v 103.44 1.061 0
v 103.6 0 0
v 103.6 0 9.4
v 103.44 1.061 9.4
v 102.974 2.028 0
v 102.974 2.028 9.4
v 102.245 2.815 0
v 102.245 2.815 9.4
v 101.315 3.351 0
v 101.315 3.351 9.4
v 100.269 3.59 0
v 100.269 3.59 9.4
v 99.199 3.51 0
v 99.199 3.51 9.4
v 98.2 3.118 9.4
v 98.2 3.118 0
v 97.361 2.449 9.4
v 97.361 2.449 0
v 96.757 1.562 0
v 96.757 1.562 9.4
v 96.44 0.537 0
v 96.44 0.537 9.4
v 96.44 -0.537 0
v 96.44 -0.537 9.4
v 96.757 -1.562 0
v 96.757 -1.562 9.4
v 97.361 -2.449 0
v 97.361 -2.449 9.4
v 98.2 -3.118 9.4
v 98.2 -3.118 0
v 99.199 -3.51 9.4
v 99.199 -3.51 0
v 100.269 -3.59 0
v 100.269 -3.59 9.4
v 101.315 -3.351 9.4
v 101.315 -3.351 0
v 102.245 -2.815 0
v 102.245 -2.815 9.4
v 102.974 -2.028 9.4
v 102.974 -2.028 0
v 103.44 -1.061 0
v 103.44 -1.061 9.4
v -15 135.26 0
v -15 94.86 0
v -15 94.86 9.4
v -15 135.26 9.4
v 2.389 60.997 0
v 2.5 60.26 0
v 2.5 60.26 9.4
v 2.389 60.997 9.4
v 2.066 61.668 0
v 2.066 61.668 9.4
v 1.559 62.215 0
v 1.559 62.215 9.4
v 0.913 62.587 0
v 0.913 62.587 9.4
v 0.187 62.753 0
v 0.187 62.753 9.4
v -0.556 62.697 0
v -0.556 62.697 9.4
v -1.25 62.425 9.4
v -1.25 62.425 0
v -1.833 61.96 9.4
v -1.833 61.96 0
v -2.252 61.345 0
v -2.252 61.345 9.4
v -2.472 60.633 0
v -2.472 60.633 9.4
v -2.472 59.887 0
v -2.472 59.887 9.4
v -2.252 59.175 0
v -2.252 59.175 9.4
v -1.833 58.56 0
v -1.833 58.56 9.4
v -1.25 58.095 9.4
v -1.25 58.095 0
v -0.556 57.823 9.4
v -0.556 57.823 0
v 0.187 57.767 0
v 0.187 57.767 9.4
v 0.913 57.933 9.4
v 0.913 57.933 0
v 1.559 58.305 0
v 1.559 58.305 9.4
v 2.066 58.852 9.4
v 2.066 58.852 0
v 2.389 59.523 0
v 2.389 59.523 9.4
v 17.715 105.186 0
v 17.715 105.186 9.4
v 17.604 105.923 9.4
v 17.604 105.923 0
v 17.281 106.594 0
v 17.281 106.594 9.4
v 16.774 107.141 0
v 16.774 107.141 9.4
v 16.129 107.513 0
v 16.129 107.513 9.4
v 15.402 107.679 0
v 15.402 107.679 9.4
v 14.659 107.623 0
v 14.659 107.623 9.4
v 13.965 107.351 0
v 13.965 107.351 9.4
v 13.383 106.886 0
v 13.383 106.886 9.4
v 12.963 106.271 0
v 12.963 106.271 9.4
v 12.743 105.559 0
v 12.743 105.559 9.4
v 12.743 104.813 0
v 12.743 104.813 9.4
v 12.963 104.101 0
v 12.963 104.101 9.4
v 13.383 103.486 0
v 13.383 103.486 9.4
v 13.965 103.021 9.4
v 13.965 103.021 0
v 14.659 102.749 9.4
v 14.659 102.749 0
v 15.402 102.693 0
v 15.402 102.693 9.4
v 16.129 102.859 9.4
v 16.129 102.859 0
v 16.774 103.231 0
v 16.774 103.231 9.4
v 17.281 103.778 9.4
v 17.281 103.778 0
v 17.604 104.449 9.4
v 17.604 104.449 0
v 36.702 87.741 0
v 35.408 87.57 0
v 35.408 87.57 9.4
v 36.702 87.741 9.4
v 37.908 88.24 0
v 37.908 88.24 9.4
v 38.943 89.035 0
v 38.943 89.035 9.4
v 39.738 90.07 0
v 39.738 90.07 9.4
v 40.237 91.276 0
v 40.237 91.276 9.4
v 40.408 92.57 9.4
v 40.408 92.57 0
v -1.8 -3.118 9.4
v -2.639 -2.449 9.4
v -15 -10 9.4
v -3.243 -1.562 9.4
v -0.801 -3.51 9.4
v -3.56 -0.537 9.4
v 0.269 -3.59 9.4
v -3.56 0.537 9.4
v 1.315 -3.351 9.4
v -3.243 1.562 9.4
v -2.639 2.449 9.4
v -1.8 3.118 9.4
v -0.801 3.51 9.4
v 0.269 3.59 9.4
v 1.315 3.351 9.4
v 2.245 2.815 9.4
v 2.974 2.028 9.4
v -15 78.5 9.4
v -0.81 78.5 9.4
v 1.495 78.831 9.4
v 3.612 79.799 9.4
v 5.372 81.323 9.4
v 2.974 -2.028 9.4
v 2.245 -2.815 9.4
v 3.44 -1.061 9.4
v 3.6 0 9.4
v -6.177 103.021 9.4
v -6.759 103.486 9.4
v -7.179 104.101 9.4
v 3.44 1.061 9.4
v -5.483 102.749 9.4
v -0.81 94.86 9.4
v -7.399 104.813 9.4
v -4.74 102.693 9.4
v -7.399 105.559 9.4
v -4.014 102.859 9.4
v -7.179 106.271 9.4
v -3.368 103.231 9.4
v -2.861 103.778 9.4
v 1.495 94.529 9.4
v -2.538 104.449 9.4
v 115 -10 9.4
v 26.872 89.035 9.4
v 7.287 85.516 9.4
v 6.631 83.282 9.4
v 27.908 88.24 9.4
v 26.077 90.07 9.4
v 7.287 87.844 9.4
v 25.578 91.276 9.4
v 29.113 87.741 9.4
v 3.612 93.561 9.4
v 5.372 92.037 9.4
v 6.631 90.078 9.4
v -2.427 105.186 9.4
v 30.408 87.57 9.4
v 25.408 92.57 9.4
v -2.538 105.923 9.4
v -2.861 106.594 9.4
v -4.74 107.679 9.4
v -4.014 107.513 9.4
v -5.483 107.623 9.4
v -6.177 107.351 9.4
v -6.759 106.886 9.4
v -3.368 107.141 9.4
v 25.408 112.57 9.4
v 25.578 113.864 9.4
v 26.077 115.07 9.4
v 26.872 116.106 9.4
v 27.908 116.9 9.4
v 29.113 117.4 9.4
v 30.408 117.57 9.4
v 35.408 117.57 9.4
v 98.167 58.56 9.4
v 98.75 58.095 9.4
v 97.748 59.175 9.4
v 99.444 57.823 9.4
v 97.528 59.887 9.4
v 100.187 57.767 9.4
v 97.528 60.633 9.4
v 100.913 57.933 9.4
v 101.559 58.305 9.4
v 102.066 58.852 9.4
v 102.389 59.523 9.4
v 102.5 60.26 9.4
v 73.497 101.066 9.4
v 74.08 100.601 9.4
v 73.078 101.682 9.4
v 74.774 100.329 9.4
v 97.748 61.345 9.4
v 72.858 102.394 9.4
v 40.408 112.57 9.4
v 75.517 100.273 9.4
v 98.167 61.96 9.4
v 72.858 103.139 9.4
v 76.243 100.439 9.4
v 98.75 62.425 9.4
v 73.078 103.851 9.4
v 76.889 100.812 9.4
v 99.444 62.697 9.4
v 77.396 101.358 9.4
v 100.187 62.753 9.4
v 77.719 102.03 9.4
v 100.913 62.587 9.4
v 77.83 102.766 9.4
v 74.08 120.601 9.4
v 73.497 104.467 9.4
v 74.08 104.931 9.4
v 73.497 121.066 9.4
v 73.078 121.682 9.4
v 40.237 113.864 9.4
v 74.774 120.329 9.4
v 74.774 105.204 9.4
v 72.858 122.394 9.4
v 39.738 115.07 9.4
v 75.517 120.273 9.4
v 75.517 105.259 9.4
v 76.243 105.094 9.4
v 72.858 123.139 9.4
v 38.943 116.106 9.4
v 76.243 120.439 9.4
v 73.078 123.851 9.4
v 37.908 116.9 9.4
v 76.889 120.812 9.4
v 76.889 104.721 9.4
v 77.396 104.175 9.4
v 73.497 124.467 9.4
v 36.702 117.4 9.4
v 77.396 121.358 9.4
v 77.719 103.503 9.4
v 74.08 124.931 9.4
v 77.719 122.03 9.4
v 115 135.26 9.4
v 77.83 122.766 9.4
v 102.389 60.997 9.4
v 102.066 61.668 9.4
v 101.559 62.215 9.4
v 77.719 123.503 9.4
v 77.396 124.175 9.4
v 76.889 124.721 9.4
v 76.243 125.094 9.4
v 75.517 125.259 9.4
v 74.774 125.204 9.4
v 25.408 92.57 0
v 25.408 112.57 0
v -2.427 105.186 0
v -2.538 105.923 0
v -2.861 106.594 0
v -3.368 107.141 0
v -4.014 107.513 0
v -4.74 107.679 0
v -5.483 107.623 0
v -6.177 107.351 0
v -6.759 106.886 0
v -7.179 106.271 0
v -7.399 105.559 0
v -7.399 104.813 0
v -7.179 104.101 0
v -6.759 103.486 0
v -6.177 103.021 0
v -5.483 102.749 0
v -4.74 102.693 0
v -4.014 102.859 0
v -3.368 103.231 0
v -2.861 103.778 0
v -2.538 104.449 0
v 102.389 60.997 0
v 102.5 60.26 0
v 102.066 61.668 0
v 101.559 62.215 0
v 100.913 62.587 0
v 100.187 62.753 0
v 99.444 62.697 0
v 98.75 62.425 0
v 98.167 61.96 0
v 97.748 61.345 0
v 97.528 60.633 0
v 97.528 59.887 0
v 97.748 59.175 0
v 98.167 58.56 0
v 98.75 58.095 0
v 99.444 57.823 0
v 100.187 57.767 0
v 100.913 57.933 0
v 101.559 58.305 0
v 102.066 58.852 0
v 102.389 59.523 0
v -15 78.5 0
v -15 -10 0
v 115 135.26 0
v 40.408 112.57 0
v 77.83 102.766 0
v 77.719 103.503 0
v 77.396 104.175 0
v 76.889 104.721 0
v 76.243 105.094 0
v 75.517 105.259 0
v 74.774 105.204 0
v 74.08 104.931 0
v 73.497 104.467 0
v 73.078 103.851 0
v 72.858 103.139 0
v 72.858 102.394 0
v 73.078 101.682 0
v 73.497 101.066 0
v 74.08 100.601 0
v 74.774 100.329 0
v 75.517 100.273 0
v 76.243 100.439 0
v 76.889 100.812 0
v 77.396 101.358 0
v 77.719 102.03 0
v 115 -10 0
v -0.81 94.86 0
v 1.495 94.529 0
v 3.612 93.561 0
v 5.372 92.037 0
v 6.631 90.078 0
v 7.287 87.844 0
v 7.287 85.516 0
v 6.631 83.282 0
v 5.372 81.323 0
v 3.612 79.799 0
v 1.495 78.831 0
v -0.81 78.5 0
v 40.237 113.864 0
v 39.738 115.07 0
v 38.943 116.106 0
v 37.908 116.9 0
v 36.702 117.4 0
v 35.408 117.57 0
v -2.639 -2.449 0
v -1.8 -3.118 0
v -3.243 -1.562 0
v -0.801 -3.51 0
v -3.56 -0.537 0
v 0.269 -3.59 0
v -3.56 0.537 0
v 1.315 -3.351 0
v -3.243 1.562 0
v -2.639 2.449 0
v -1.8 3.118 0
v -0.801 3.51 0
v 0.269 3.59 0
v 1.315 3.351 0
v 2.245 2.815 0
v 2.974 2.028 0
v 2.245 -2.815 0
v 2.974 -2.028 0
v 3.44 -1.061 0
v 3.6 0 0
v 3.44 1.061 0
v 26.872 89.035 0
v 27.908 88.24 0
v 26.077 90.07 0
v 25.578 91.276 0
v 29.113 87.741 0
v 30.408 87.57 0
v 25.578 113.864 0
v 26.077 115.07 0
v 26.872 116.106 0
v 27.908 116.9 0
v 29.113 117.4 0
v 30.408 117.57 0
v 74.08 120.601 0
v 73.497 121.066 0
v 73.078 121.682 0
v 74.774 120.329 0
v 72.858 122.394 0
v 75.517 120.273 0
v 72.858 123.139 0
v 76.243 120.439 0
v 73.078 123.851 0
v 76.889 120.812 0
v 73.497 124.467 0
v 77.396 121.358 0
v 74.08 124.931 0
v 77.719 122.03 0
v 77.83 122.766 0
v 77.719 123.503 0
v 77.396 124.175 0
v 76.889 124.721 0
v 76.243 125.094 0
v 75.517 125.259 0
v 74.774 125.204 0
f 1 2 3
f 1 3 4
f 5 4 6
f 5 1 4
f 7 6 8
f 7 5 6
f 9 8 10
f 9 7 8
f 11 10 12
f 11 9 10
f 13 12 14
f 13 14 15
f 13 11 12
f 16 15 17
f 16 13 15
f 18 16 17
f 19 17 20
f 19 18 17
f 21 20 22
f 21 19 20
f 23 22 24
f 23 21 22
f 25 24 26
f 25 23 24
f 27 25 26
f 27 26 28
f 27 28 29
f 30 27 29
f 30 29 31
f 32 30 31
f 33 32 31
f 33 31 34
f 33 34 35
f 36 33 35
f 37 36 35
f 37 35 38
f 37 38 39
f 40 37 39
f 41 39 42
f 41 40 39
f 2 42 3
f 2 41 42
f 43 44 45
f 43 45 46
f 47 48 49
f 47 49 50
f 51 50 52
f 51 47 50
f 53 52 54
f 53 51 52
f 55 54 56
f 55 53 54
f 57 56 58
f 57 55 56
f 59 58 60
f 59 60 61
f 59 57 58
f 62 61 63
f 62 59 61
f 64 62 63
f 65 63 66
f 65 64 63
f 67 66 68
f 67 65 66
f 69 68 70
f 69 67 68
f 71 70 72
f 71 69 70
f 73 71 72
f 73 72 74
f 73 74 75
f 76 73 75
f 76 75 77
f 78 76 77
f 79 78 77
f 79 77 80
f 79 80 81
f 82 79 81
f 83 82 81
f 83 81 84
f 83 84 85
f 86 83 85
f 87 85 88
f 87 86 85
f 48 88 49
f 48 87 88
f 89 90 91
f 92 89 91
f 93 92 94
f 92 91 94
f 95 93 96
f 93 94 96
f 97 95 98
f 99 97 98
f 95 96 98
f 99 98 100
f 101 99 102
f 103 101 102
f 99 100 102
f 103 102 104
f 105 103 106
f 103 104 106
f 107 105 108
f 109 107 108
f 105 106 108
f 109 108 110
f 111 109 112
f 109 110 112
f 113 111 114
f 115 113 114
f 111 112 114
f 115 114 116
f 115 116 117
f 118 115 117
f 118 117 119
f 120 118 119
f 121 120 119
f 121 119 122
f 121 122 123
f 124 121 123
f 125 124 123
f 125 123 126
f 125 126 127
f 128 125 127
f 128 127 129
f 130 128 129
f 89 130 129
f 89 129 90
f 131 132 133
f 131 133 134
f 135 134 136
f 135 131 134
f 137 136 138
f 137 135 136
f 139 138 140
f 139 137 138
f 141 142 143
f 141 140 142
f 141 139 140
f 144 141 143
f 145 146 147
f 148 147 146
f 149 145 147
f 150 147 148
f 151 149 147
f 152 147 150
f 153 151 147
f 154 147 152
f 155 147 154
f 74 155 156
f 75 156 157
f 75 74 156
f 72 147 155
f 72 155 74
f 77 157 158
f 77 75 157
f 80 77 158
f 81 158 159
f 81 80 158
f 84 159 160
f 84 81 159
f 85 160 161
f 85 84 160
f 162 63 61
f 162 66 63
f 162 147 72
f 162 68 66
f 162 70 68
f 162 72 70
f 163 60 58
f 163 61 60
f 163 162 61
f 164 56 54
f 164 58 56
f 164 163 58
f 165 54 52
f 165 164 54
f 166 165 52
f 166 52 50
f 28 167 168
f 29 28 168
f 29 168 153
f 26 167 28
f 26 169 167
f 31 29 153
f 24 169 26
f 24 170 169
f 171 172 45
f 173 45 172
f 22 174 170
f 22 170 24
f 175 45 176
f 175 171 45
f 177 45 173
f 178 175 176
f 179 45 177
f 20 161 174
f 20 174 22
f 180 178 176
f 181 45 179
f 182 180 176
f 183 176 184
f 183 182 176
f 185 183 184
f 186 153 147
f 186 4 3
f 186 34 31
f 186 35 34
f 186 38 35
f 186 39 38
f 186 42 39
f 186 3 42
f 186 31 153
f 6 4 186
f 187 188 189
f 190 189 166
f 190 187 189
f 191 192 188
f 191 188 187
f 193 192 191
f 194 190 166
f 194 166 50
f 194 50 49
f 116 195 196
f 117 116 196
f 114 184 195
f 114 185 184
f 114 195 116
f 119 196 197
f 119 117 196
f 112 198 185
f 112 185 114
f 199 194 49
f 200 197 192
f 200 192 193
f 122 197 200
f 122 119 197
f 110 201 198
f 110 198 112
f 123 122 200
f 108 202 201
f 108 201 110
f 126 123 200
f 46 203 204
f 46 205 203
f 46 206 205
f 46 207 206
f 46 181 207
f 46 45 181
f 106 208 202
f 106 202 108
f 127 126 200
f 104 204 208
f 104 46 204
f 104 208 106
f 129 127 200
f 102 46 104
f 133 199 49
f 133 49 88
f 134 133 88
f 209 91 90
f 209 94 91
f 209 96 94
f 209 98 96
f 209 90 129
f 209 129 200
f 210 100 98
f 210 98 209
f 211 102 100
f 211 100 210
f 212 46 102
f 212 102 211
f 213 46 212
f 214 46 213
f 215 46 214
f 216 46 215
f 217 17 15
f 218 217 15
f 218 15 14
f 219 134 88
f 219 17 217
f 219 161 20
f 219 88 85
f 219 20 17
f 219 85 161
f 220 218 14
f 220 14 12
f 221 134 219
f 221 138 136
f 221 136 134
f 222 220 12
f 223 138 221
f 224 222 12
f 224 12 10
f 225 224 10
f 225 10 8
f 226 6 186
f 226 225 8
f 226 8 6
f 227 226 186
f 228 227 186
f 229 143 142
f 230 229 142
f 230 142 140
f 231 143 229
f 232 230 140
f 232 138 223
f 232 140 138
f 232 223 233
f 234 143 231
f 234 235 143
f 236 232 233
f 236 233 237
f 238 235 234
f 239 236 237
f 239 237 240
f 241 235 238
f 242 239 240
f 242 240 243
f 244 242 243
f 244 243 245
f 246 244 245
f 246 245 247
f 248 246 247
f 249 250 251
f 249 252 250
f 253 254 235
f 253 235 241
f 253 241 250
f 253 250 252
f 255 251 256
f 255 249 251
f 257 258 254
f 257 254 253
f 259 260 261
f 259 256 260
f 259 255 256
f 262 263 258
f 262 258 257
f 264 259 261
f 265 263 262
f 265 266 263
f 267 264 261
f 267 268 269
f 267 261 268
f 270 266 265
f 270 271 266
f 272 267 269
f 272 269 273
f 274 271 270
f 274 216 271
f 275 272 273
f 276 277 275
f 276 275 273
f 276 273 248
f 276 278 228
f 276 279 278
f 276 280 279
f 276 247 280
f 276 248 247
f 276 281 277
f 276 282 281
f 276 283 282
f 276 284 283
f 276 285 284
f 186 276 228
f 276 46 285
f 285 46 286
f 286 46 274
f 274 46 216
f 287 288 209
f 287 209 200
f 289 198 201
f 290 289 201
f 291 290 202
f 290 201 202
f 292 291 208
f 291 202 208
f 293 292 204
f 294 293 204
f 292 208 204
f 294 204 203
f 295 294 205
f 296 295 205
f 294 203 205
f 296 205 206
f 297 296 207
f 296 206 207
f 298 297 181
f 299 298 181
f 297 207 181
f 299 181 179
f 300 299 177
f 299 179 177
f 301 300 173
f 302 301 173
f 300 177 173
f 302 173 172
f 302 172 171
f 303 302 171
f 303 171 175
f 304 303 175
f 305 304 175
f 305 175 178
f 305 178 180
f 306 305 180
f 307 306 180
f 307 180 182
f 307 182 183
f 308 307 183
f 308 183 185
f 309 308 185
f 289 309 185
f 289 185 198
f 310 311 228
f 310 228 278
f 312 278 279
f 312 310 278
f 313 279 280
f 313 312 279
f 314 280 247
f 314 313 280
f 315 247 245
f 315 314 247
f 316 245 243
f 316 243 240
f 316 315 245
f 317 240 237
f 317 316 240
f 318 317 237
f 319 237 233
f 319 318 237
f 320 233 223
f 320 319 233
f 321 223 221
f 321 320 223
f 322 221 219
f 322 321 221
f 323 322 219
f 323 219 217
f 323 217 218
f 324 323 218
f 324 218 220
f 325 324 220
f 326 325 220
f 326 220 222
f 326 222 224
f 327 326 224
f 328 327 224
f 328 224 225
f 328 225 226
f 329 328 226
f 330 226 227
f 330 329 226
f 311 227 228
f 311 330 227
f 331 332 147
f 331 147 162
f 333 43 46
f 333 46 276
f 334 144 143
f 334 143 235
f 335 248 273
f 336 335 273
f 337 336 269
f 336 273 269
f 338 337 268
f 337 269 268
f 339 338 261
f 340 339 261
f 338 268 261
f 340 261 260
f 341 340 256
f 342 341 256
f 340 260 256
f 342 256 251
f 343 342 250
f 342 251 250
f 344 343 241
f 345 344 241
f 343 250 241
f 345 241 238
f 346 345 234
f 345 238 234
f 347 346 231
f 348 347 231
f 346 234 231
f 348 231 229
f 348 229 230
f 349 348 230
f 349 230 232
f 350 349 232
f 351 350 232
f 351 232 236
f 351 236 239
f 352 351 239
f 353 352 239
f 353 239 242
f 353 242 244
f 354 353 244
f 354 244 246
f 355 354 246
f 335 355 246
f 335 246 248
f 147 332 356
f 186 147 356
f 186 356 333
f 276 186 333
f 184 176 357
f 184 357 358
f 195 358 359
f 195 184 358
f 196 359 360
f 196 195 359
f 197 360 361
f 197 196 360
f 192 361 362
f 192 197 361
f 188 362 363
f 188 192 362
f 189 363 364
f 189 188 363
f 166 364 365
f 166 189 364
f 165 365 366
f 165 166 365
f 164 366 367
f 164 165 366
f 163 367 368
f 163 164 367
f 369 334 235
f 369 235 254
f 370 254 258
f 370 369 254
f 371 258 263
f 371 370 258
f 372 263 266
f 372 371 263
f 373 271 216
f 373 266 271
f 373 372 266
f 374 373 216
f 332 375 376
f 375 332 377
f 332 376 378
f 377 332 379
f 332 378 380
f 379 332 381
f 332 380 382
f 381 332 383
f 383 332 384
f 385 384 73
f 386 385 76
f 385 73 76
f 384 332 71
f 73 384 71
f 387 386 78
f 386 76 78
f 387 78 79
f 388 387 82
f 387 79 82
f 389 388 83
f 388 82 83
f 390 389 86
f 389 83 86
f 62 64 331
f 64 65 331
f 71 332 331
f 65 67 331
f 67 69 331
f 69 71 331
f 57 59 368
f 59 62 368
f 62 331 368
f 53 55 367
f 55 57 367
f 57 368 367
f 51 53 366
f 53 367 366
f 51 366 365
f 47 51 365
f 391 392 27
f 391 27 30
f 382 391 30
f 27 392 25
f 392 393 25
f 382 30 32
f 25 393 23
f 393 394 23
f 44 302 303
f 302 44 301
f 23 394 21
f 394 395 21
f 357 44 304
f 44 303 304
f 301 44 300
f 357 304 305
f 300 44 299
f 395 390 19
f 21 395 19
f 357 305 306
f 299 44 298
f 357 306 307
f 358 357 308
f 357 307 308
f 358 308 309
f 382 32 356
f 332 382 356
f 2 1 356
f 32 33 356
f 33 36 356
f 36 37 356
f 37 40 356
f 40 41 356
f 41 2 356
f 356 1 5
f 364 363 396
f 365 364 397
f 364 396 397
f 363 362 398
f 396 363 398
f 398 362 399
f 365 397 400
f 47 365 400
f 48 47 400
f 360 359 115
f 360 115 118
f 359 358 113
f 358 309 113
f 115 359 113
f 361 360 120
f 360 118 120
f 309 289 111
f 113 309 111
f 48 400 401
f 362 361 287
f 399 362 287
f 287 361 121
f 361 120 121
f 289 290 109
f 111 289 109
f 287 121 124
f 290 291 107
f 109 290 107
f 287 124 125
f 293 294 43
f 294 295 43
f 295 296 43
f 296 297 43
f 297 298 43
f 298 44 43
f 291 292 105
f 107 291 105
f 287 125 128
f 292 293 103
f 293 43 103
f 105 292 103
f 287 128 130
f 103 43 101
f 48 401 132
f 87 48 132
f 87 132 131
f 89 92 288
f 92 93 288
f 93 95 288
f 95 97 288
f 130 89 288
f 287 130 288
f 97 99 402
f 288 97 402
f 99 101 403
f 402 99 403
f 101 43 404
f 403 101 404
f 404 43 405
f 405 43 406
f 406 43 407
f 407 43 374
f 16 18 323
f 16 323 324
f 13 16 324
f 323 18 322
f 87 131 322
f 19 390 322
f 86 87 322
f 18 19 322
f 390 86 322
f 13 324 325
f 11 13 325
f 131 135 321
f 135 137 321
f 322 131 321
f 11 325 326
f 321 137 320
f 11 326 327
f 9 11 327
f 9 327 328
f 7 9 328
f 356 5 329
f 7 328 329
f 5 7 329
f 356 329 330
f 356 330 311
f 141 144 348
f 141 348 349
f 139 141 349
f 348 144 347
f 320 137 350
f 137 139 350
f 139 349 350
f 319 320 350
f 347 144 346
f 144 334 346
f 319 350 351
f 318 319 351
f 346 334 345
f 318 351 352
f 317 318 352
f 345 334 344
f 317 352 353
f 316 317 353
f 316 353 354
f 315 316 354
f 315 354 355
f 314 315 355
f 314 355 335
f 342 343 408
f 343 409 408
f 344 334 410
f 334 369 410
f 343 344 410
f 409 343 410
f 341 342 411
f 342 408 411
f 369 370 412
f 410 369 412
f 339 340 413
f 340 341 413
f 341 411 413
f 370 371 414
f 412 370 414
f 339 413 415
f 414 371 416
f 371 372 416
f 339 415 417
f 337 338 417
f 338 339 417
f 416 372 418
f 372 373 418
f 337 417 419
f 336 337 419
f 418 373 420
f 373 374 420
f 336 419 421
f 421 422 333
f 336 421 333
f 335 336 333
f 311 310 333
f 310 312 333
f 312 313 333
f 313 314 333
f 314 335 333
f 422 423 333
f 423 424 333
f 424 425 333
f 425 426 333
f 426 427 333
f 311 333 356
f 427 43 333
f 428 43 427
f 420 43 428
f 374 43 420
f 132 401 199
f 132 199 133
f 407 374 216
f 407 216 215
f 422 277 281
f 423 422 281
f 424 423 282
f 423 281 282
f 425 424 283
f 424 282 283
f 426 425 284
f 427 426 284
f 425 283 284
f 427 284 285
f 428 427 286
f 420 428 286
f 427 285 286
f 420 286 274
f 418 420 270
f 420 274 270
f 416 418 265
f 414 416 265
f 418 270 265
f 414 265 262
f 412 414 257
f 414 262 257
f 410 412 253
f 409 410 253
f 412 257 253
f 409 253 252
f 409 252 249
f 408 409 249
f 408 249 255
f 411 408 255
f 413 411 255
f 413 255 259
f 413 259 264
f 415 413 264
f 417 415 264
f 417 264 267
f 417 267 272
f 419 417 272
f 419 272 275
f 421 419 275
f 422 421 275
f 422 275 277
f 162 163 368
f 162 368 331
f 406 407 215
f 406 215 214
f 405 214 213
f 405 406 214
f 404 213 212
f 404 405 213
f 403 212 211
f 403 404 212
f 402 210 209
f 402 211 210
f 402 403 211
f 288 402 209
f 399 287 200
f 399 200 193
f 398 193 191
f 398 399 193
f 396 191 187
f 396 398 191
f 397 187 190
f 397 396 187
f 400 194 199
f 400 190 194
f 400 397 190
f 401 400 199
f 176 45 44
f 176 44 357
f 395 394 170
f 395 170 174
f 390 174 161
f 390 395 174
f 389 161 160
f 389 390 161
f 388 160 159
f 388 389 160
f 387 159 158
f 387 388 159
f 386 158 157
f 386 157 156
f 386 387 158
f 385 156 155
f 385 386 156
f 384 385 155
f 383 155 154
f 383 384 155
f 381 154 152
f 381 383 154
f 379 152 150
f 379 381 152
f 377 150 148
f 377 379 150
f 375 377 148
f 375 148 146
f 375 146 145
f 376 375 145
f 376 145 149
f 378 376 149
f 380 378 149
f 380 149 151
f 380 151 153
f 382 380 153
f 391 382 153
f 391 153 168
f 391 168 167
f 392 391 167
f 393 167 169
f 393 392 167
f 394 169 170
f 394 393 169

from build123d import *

# Parameters (mm, degrees)
SKETCH1_W           = 130
SKETCH1_H           = 145.26
SKETCH1_R           = 3.6
SKETCH1_R_2         = 2.5
BOSS_EXTRUDE1_DEPTH = 9.4
SKETCH2_R           = 2.5
CUT_EXTRUDE1_DEPTH  = 10.4
CUT_EXTRUDE2_DEPTH  = 10.4
CUT_EXTRUDE3_DEPTH  = 10.4
SKETCH5_R           = 2.5
CUT_EXTRUDE4_DEPTH  = 10.4


with BuildPart() as part:
    # Sketch1 → Boss-Extrude1 (new body)
    with BuildSketch(Plane.XY):
        with Locations((50, 62.63)):
            Rectangle(SKETCH1_W, SKETCH1_H)
        Circle(SKETCH1_R, mode=Mode.SUBTRACT)
        with Locations((0, 60.26)):
            Circle(SKETCH1_R_2, mode=Mode.SUBTRACT)
        with Locations((100, 60.26)):
            Circle(SKETCH1_R_2, mode=Mode.SUBTRACT)
        with Locations((100, 0)):
            Circle(SKETCH1_R, mode=Mode.SUBTRACT)
    extrude(amount=BOSS_EXTRUDE1_DEPTH)

    # Sketch2 → Cut-Extrude1 (cut, through all)
    with BuildSketch(Plane.XY.offset(9.4)):
        with Locations((75.33, 122.766411568)):
            Circle(SKETCH2_R)
        with Locations((75.33, 102.766411568)):
            Circle(SKETCH2_R)
    extrude(amount=-CUT_EXTRUDE1_DEPTH, mode=Mode.SUBTRACT)

    # Sketch3 → Cut-Extrude2 (cut, through all)
    with BuildSketch(Plane(origin=(0, 0, 0), x_dir=(-1, 0, 0), z_dir=(0, 0, -1))):
        with BuildLine():
            Line((-35.40754614, 117.570367495), (-30.40754614, 117.570367495))
            ThreePointArc((-30.40754614, 117.570367495), (-26.872012234, 116.105901401), (-25.40754614, 112.570367495))
            Line((-25.40754614, 112.570367495), (-25.40754614, 92.570367495))
            ThreePointArc((-25.40754614, 92.570367495), (-26.872012234, 89.034833589), (-30.40754614, 87.570367495))
            Line((-30.40754614, 87.570367495), (-35.40754614, 87.570367495))
            ThreePointArc((-35.40754614, 87.570367495), (-38.943080046, 89.034833589), (-40.40754614, 92.570367495))
            Line((-40.40754614, 92.570367495), (-40.40754614, 112.570367495))
            ThreePointArc((-40.40754614, 112.570367495), (-38.943080046, 116.105901401), (-35.40754614, 117.570367495))
        make_face()
    extrude(amount=-CUT_EXTRUDE2_DEPTH, mode=Mode.SUBTRACT)

    # Sketch4 → Cut-Extrude3 (cut, through all)
    with BuildSketch(Plane.XY.offset(9.4)):
        with BuildLine():
            Line((-15, 78.5), (-15, 94.86))
            Line((-15, 94.86), (-0.81, 94.86))
            ThreePointArc((-0.81, 94.86), (7.37, 86.68), (-0.81, 78.5))
            Line((-0.81, 78.5), (-15, 78.5))
        make_face()
    extrude(amount=-CUT_EXTRUDE3_DEPTH, mode=Mode.SUBTRACT)

    # Sketch5 → Cut-Extrude4 (cut, through all)
    with BuildSketch(Plane.XY.offset(9.4)):
        with Locations((-4.926856844, 105.186)):
            Circle(SKETCH5_R)
        with Locations((15.215343156, 105.186)):
            Circle(SKETCH5_R)
    extrude(amount=-CUT_EXTRUDE4_DEPTH, mode=Mode.SUBTRACT)


solid = part.part
